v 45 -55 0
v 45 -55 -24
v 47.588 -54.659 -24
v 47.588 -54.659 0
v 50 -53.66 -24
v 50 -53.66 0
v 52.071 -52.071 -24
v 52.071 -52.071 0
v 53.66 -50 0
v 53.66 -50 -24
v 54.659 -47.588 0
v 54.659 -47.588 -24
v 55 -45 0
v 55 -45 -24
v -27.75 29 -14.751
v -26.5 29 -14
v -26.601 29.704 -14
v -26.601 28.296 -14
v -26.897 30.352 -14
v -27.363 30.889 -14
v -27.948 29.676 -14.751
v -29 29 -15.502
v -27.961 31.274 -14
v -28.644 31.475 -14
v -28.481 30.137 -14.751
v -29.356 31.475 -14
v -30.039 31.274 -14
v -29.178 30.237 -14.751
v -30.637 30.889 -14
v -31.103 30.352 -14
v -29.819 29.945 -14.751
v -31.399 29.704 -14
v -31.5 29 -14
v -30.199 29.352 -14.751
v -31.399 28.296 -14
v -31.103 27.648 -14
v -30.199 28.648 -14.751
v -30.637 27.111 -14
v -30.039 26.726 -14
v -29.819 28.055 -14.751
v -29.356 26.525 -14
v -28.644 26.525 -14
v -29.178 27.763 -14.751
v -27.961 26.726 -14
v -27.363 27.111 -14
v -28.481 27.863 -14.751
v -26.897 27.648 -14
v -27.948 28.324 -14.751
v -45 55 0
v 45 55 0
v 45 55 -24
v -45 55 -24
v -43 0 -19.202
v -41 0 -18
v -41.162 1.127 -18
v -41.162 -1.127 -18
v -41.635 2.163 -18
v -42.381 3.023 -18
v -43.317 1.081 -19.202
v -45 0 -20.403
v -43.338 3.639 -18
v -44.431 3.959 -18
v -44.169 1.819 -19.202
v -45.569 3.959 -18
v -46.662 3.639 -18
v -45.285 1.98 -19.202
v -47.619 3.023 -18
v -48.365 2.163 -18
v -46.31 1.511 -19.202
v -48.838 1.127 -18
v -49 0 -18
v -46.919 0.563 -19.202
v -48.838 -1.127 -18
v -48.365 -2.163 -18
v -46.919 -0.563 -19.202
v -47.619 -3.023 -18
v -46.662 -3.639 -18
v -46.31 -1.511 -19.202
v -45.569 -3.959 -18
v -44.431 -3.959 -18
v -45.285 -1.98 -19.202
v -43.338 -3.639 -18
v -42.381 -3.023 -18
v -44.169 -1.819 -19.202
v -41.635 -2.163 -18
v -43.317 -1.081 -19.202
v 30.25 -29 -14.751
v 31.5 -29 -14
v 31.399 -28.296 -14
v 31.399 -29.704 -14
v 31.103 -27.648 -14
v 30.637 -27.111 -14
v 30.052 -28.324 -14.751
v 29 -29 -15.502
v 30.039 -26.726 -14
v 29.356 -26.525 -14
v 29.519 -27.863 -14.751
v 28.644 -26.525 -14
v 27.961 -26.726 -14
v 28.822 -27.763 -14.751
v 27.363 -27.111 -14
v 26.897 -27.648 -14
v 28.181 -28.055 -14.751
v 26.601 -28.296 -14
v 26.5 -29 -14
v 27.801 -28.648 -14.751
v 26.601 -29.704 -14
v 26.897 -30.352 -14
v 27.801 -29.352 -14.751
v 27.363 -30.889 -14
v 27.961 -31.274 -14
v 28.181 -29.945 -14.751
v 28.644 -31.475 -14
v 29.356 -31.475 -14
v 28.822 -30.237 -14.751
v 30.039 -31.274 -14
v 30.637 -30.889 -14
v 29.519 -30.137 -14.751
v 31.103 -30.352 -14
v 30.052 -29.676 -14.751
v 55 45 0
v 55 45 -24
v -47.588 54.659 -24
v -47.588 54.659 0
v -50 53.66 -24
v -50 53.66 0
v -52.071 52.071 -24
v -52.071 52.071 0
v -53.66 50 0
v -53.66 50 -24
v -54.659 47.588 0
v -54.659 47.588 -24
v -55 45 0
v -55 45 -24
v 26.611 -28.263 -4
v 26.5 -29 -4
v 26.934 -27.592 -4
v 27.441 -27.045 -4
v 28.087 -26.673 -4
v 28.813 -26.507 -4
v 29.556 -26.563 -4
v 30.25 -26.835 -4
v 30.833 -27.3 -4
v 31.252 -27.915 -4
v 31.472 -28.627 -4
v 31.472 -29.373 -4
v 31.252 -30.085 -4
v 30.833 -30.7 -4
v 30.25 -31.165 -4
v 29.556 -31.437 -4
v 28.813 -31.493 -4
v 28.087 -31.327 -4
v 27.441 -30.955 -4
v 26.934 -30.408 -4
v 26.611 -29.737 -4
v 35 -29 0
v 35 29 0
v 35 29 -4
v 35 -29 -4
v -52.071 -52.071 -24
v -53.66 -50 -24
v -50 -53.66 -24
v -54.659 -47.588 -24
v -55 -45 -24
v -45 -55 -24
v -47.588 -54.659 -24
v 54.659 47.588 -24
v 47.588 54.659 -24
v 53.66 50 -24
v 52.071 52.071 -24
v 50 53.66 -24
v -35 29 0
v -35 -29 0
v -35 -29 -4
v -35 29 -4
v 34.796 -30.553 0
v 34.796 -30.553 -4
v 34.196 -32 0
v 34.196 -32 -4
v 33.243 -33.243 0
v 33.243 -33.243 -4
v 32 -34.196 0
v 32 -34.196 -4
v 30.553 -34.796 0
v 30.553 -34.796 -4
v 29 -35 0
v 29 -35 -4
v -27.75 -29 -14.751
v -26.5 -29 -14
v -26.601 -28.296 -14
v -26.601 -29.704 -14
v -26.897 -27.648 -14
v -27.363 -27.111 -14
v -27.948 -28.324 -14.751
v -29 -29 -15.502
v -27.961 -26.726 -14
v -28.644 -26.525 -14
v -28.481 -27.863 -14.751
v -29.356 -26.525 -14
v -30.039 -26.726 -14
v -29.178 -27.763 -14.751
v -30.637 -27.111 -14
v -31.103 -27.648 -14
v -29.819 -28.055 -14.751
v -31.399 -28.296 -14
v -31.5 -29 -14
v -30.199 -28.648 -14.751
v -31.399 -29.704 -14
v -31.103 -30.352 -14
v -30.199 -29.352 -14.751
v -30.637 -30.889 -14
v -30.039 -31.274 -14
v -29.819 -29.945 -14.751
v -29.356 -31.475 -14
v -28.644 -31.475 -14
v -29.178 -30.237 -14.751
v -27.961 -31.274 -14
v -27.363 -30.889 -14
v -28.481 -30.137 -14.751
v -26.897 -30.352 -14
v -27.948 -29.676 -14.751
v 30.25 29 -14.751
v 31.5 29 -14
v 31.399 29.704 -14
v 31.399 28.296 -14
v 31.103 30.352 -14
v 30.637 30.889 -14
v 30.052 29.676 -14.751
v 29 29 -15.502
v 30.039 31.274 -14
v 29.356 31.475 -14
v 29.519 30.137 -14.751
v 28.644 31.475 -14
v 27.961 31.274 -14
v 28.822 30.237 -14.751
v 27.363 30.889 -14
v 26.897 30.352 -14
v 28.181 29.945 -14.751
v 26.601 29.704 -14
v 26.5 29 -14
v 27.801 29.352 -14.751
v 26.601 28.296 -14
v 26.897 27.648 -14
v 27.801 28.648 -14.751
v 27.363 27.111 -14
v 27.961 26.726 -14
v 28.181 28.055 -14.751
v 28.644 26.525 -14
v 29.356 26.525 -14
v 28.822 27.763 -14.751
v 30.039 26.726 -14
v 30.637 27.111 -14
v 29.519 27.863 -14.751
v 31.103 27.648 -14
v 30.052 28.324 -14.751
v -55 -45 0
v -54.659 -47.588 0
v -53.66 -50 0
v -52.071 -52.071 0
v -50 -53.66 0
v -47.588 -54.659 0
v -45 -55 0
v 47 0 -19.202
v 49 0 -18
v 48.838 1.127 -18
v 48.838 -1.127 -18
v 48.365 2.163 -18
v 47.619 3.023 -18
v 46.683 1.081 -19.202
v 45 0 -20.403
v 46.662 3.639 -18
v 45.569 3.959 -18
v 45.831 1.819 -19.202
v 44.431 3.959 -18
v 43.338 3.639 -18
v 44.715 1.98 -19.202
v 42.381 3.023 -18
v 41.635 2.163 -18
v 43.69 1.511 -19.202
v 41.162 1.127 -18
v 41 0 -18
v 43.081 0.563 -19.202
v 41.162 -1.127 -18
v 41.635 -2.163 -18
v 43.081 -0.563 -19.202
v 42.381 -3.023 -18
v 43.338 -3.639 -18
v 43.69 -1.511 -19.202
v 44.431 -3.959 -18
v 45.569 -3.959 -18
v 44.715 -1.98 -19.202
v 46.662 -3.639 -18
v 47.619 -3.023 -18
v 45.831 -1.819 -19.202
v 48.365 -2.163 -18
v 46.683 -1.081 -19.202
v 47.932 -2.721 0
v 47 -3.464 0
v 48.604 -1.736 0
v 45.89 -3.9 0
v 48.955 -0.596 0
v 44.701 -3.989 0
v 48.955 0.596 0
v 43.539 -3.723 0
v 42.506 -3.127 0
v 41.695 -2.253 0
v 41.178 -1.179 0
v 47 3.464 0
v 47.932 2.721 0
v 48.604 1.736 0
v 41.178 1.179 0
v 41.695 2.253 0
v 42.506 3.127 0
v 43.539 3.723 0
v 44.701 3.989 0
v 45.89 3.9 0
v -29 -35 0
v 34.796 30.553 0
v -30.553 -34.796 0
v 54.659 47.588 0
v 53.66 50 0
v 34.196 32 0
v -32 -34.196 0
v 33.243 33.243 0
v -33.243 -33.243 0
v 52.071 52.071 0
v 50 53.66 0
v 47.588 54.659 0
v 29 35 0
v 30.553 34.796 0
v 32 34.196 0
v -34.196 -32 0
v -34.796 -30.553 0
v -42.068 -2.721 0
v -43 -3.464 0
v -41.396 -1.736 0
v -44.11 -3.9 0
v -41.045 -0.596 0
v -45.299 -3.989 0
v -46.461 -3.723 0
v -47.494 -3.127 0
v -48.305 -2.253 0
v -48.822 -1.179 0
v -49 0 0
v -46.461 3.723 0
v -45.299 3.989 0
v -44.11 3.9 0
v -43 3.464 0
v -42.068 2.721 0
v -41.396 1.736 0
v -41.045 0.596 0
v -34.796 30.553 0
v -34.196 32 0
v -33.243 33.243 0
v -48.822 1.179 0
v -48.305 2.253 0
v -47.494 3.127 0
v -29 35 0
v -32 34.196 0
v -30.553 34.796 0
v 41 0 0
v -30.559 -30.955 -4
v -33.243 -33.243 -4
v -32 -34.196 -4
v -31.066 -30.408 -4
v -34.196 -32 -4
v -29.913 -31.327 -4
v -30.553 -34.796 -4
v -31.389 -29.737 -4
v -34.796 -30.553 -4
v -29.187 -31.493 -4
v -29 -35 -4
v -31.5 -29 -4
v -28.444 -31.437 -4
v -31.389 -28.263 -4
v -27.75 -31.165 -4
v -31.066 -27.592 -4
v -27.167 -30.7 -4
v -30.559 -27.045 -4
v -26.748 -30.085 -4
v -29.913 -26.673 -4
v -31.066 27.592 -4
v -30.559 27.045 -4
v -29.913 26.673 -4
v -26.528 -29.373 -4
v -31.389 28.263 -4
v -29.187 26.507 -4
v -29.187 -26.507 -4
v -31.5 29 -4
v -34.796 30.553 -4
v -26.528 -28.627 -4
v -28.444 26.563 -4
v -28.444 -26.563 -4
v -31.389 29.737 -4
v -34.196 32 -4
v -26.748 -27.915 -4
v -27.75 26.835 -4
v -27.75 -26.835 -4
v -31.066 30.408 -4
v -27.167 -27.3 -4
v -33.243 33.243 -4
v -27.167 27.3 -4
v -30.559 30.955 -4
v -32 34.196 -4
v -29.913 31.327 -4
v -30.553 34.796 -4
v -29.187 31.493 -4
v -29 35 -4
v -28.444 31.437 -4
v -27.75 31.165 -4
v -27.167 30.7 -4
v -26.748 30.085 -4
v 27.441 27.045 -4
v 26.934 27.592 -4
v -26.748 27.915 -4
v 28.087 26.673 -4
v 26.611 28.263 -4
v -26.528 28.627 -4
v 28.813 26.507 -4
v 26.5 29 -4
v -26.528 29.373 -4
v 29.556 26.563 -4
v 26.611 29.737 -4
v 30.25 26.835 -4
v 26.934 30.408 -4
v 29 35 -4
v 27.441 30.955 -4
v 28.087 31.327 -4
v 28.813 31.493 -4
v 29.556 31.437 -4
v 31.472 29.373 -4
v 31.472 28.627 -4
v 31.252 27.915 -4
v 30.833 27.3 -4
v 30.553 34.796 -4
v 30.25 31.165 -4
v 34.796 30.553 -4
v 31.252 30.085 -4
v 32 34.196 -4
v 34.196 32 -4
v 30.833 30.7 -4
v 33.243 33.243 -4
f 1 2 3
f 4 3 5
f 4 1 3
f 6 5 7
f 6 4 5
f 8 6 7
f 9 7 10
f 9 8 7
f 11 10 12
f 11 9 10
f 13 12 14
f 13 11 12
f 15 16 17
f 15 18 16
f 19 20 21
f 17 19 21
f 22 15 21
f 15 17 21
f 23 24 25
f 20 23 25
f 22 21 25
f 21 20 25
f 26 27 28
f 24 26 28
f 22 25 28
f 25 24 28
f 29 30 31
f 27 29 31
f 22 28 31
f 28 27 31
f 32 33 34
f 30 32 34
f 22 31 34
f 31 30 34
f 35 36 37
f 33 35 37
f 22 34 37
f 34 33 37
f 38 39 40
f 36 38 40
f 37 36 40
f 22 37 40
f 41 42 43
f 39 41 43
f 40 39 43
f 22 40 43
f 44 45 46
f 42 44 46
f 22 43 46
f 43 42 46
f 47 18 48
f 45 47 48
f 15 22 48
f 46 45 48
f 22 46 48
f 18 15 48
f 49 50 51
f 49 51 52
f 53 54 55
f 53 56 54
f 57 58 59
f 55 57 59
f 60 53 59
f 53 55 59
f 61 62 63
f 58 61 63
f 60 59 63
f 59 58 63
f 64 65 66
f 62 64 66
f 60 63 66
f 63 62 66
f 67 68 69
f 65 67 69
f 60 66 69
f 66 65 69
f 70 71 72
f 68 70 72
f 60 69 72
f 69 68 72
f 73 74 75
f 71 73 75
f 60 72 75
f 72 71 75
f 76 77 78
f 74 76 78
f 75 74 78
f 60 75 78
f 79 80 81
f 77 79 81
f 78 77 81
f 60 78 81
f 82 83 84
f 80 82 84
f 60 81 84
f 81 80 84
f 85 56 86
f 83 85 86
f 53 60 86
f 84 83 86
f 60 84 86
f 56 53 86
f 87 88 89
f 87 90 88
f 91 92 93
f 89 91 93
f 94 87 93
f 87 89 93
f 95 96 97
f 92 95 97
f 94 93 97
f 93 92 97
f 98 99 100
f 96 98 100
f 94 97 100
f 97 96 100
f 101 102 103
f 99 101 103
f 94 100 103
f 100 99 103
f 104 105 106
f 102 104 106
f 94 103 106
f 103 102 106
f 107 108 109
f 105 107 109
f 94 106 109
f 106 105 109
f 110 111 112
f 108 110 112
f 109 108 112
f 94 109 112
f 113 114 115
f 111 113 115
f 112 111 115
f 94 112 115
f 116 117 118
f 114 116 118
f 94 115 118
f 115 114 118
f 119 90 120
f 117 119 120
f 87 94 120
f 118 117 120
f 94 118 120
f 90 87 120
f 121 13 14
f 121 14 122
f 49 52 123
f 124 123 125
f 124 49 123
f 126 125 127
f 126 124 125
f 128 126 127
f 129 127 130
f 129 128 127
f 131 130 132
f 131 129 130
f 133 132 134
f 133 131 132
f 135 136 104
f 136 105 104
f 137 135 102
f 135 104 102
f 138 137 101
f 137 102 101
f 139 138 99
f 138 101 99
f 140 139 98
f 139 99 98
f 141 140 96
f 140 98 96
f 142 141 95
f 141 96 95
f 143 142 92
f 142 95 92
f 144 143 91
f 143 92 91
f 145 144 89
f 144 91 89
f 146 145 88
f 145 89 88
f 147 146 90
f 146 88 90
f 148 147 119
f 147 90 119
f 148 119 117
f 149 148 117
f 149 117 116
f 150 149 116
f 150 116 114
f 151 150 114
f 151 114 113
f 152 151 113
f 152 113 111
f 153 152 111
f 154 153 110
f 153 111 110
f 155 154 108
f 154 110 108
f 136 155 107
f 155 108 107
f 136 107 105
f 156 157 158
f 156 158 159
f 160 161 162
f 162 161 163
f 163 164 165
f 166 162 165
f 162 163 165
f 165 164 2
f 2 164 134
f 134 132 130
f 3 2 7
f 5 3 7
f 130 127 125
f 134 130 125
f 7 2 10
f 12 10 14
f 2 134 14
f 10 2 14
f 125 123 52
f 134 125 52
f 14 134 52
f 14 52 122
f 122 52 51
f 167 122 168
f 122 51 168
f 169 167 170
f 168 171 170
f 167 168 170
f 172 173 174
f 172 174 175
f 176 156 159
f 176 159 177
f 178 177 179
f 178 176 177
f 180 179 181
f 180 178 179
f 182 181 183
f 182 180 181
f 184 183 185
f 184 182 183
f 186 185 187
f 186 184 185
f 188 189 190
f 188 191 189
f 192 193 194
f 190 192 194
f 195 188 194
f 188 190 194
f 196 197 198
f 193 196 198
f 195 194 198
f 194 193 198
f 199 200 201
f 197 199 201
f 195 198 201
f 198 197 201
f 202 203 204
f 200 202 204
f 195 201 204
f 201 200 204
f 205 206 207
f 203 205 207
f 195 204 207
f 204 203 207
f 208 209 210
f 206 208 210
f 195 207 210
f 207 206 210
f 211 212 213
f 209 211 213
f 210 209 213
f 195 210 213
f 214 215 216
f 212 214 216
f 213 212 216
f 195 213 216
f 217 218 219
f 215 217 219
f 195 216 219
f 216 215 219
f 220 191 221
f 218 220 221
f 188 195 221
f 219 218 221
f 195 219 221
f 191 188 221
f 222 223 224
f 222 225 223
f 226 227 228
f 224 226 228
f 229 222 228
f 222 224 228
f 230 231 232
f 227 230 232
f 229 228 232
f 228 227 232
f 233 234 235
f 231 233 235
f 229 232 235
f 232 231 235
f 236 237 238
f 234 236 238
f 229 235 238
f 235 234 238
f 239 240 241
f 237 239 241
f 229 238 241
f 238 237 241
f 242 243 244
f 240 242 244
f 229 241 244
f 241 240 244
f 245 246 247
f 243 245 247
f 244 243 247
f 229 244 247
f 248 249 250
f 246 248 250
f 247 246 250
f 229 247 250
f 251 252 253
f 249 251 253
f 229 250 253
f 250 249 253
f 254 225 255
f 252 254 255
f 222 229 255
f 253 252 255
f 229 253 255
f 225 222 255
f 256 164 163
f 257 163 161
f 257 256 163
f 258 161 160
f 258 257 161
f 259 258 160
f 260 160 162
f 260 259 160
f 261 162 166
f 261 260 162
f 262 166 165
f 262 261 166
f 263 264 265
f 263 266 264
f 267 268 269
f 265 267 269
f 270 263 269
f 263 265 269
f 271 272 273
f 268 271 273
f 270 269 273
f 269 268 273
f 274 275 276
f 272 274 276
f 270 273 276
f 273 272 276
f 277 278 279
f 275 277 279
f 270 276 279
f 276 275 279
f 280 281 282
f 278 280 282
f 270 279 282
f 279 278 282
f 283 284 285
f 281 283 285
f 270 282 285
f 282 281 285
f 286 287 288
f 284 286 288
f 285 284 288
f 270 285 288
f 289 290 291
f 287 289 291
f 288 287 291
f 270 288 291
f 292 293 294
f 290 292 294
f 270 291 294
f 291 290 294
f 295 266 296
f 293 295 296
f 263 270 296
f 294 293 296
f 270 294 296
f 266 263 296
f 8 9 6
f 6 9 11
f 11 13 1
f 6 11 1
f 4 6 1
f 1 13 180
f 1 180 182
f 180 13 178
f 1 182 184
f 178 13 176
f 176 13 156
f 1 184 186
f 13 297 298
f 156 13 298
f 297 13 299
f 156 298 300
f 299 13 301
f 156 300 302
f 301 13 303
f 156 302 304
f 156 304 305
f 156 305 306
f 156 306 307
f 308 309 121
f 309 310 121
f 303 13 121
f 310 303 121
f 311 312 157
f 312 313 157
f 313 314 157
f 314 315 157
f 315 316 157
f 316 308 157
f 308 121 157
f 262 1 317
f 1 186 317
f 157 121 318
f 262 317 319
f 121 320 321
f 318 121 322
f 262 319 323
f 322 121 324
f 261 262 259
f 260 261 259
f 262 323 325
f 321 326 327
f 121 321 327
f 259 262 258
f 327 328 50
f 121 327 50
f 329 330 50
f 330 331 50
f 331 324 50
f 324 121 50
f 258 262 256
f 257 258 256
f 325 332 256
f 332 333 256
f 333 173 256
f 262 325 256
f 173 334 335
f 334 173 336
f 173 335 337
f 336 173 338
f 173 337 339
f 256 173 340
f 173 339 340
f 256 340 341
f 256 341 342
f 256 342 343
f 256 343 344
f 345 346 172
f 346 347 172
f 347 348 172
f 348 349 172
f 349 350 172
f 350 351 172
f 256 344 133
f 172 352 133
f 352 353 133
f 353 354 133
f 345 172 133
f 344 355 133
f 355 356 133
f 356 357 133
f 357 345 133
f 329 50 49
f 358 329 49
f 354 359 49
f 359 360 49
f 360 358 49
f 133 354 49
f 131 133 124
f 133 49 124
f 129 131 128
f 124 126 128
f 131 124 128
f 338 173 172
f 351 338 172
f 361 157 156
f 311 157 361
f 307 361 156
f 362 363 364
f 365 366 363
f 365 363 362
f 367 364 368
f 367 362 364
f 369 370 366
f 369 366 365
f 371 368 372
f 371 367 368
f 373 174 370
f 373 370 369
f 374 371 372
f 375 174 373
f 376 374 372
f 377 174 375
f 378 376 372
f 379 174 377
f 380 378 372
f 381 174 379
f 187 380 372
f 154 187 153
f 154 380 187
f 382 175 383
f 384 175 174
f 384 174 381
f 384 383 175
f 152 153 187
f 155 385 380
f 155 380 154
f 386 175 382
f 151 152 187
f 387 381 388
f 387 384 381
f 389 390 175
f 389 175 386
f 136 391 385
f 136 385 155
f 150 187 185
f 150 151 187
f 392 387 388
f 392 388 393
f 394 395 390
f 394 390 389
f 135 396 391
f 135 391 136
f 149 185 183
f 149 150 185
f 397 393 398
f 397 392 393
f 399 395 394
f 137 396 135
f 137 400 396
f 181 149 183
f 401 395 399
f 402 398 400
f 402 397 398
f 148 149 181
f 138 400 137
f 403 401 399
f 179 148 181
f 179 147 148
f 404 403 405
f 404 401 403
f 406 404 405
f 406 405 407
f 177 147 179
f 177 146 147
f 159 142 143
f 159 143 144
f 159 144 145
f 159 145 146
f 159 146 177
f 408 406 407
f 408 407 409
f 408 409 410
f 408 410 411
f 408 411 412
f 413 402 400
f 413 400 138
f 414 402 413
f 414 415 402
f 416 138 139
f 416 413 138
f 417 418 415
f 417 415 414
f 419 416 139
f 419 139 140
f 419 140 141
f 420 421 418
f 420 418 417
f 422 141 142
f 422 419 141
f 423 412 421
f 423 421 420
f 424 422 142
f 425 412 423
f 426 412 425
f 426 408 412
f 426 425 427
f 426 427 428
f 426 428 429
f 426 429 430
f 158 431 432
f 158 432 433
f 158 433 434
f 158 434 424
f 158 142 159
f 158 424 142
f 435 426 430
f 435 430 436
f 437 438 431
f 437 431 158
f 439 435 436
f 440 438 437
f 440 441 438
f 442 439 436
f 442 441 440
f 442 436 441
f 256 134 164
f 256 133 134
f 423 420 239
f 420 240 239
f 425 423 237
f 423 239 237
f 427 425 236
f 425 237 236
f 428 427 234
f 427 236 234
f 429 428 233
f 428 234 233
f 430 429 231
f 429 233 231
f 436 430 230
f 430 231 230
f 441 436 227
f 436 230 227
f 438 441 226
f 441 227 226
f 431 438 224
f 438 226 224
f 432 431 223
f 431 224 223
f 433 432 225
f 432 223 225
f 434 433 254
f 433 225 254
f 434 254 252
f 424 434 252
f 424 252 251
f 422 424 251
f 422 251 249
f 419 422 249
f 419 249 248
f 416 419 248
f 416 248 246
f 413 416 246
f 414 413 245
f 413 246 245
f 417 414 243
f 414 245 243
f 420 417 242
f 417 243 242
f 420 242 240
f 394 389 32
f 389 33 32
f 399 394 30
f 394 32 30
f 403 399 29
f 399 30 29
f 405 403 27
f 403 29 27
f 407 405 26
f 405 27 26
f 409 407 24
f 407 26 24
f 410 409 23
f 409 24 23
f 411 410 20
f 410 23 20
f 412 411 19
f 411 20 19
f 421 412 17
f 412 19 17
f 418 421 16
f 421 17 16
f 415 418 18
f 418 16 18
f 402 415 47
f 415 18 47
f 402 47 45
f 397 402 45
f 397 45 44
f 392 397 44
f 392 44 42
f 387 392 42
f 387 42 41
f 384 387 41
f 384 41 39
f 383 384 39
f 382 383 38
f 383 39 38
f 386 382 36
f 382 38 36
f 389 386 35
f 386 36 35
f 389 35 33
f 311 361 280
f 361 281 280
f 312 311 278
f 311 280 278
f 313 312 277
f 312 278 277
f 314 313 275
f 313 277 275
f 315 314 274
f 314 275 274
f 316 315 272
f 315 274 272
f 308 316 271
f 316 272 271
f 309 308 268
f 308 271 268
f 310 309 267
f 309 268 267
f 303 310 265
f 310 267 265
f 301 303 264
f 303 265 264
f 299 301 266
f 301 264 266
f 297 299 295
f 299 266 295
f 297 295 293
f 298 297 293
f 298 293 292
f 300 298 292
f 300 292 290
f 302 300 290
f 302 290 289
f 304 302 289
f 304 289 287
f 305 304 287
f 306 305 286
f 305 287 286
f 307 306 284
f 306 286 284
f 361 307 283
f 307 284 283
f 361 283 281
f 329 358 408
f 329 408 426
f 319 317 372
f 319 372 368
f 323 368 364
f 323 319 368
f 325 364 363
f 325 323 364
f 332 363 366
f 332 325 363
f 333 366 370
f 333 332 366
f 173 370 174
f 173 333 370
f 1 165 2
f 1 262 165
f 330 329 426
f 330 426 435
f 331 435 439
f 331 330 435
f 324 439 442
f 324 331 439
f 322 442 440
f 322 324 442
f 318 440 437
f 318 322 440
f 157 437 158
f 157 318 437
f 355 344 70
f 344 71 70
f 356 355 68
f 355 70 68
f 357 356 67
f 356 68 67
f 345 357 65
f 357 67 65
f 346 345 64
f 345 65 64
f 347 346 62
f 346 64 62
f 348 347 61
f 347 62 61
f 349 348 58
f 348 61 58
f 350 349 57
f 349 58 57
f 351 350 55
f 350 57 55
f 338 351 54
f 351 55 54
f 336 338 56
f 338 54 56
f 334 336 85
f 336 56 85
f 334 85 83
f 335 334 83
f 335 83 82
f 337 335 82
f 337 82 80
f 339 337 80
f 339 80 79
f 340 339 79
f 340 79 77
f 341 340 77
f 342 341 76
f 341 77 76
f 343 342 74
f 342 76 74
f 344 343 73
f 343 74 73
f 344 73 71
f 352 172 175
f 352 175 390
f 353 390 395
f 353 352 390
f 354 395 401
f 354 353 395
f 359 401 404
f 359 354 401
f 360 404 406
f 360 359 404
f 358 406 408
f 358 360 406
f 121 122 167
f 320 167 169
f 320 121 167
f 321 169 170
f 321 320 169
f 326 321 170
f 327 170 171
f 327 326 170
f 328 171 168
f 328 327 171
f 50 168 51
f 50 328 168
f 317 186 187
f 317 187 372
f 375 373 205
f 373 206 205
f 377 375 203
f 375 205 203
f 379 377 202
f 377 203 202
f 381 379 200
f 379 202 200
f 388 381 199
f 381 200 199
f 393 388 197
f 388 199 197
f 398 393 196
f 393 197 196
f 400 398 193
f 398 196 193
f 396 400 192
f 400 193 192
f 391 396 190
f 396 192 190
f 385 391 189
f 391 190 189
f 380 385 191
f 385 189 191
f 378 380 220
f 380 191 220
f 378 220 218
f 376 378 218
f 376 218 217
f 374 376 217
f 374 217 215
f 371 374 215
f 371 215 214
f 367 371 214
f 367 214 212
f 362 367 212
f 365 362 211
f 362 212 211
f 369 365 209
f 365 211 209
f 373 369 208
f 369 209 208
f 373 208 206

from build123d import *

# Parameters (mm, degrees)
BOSS_EXTRUDE1_DEPTH             = 4
BOSS_EXTRUDE2_DEPTH             = 20
F_8_0MM_DOWEL_HOLE1_D           = 8
F_8_0MM_DOWEL_HOLE1_DEPTH       = 18
F_8_0MM_DOWEL_HOLE1_TIP         = 2.403442476
TAP_DRILL_FOR_M6X1_0_TAP1_D     = 5
TAP_DRILL_FOR_M6X1_0_TAP1_DEPTH = 10
TAP_DRILL_FOR_M6X1_0_TAP1_TIP   = 1.502151548


with BuildPart() as part:
    # Sketch1 → Boss-Extrude1 (new body)
    with BuildSketch(Plane.XY):
        with BuildLine():
            Line((-45, 55), (45, 55))
            ThreePointArc((45, 55), (52.071067812, 52.071067812), (55, 45))
            Line((55, 45), (55, -45))
            ThreePointArc((55, -45), (52.071067812, -52.071067812), (45, -55))
            Line((45, -55), (-45, -55))
            ThreePointArc((-45, -55), (-52.071067812, -52.071067812), (-55, -45))
            Line((-55, -45), (-55, 45))
            ThreePointArc((-55, 45), (-52.071067812, 52.071067812), (-45, 55))
        make_face()
        with BuildLine():
            Line((-29, 35), (29, 35))
            ThreePointArc((29, 35), (33.242640687, 33.242640687), (35, 29))
            Line((35, 29), (35, -29))
            ThreePointArc((35, -29), (33.242640687, -33.242640687), (29, -35))
            Line((29, -35), (-29, -35))
            ThreePointArc((-29, -35), (-33.242640687, -33.242640687), (-35, -29))
            Line((-35, -29), (-35, 29))
            ThreePointArc((-35, 29), (-33.242640687, 33.242640687), (-29, 35))
        make_face(mode=Mode.SUBTRACT)
    extrude(amount=-BOSS_EXTRUDE1_DEPTH)

    # Sketch2 → Boss-Extrude2 (add)
    with BuildSketch(Plane.XY.offset(-4)):
        with BuildLine():
            Line((-45, -55), (45, -55))
            ThreePointArc((45, -55), (52.071067812, -52.071067812), (55, -45))
            Line((55, -45), (55, 45))
            ThreePointArc((55, 45), (52.071067812, 52.071067812), (45, 55))
            Line((45, 55), (-45, 55))
            ThreePointArc((-45, 55), (-52.071067812, 52.071067812), (-55, 45))
            Line((-55, 45), (-55, -45))
            ThreePointArc((-55, -45), (-52.071067812, -52.071067812), (-45, -55))
        make_face()
    extrude(amount=-BOSS_EXTRUDE2_DEPTH)

    # Ø8.0mm Dowel Hole1
    with Locations(Plane.XY):
        with Locations((-45, 0), (45, 0)):
            Hole(F_8_0MM_DOWEL_HOLE1_D / 2, depth=F_8_0MM_DOWEL_HOLE1_DEPTH)
            with Locations((0, 0, -(F_8_0MM_DOWEL_HOLE1_DEPTH + F_8_0MM_DOWEL_HOLE1_TIP / 2))):  # 118° drill point
                Cone(0, F_8_0MM_DOWEL_HOLE1_D / 2, F_8_0MM_DOWEL_HOLE1_TIP, mode=Mode.SUBTRACT)

    # Tap Drill for M6x1.0 Tap1
    with Locations(Plane.XY.offset(-4)):
        with Locations((-29, 29), (29, 29), (29, -29), (-29, -29)):
            Hole(TAP_DRILL_FOR_M6X1_0_TAP1_D / 2, depth=TAP_DRILL_FOR_M6X1_0_TAP1_DEPTH)
            with Locations((0, 0, -(TAP_DRILL_FOR_M6X1_0_TAP1_DEPTH + TAP_DRILL_FOR_M6X1_0_TAP1_TIP / 2))):  # 118° drill point
                Cone(0, TAP_DRILL_FOR_M6X1_0_TAP1_D / 2, TAP_DRILL_FOR_M6X1_0_TAP1_TIP, mode=Mode.SUBTRACT)


solid = part.part
